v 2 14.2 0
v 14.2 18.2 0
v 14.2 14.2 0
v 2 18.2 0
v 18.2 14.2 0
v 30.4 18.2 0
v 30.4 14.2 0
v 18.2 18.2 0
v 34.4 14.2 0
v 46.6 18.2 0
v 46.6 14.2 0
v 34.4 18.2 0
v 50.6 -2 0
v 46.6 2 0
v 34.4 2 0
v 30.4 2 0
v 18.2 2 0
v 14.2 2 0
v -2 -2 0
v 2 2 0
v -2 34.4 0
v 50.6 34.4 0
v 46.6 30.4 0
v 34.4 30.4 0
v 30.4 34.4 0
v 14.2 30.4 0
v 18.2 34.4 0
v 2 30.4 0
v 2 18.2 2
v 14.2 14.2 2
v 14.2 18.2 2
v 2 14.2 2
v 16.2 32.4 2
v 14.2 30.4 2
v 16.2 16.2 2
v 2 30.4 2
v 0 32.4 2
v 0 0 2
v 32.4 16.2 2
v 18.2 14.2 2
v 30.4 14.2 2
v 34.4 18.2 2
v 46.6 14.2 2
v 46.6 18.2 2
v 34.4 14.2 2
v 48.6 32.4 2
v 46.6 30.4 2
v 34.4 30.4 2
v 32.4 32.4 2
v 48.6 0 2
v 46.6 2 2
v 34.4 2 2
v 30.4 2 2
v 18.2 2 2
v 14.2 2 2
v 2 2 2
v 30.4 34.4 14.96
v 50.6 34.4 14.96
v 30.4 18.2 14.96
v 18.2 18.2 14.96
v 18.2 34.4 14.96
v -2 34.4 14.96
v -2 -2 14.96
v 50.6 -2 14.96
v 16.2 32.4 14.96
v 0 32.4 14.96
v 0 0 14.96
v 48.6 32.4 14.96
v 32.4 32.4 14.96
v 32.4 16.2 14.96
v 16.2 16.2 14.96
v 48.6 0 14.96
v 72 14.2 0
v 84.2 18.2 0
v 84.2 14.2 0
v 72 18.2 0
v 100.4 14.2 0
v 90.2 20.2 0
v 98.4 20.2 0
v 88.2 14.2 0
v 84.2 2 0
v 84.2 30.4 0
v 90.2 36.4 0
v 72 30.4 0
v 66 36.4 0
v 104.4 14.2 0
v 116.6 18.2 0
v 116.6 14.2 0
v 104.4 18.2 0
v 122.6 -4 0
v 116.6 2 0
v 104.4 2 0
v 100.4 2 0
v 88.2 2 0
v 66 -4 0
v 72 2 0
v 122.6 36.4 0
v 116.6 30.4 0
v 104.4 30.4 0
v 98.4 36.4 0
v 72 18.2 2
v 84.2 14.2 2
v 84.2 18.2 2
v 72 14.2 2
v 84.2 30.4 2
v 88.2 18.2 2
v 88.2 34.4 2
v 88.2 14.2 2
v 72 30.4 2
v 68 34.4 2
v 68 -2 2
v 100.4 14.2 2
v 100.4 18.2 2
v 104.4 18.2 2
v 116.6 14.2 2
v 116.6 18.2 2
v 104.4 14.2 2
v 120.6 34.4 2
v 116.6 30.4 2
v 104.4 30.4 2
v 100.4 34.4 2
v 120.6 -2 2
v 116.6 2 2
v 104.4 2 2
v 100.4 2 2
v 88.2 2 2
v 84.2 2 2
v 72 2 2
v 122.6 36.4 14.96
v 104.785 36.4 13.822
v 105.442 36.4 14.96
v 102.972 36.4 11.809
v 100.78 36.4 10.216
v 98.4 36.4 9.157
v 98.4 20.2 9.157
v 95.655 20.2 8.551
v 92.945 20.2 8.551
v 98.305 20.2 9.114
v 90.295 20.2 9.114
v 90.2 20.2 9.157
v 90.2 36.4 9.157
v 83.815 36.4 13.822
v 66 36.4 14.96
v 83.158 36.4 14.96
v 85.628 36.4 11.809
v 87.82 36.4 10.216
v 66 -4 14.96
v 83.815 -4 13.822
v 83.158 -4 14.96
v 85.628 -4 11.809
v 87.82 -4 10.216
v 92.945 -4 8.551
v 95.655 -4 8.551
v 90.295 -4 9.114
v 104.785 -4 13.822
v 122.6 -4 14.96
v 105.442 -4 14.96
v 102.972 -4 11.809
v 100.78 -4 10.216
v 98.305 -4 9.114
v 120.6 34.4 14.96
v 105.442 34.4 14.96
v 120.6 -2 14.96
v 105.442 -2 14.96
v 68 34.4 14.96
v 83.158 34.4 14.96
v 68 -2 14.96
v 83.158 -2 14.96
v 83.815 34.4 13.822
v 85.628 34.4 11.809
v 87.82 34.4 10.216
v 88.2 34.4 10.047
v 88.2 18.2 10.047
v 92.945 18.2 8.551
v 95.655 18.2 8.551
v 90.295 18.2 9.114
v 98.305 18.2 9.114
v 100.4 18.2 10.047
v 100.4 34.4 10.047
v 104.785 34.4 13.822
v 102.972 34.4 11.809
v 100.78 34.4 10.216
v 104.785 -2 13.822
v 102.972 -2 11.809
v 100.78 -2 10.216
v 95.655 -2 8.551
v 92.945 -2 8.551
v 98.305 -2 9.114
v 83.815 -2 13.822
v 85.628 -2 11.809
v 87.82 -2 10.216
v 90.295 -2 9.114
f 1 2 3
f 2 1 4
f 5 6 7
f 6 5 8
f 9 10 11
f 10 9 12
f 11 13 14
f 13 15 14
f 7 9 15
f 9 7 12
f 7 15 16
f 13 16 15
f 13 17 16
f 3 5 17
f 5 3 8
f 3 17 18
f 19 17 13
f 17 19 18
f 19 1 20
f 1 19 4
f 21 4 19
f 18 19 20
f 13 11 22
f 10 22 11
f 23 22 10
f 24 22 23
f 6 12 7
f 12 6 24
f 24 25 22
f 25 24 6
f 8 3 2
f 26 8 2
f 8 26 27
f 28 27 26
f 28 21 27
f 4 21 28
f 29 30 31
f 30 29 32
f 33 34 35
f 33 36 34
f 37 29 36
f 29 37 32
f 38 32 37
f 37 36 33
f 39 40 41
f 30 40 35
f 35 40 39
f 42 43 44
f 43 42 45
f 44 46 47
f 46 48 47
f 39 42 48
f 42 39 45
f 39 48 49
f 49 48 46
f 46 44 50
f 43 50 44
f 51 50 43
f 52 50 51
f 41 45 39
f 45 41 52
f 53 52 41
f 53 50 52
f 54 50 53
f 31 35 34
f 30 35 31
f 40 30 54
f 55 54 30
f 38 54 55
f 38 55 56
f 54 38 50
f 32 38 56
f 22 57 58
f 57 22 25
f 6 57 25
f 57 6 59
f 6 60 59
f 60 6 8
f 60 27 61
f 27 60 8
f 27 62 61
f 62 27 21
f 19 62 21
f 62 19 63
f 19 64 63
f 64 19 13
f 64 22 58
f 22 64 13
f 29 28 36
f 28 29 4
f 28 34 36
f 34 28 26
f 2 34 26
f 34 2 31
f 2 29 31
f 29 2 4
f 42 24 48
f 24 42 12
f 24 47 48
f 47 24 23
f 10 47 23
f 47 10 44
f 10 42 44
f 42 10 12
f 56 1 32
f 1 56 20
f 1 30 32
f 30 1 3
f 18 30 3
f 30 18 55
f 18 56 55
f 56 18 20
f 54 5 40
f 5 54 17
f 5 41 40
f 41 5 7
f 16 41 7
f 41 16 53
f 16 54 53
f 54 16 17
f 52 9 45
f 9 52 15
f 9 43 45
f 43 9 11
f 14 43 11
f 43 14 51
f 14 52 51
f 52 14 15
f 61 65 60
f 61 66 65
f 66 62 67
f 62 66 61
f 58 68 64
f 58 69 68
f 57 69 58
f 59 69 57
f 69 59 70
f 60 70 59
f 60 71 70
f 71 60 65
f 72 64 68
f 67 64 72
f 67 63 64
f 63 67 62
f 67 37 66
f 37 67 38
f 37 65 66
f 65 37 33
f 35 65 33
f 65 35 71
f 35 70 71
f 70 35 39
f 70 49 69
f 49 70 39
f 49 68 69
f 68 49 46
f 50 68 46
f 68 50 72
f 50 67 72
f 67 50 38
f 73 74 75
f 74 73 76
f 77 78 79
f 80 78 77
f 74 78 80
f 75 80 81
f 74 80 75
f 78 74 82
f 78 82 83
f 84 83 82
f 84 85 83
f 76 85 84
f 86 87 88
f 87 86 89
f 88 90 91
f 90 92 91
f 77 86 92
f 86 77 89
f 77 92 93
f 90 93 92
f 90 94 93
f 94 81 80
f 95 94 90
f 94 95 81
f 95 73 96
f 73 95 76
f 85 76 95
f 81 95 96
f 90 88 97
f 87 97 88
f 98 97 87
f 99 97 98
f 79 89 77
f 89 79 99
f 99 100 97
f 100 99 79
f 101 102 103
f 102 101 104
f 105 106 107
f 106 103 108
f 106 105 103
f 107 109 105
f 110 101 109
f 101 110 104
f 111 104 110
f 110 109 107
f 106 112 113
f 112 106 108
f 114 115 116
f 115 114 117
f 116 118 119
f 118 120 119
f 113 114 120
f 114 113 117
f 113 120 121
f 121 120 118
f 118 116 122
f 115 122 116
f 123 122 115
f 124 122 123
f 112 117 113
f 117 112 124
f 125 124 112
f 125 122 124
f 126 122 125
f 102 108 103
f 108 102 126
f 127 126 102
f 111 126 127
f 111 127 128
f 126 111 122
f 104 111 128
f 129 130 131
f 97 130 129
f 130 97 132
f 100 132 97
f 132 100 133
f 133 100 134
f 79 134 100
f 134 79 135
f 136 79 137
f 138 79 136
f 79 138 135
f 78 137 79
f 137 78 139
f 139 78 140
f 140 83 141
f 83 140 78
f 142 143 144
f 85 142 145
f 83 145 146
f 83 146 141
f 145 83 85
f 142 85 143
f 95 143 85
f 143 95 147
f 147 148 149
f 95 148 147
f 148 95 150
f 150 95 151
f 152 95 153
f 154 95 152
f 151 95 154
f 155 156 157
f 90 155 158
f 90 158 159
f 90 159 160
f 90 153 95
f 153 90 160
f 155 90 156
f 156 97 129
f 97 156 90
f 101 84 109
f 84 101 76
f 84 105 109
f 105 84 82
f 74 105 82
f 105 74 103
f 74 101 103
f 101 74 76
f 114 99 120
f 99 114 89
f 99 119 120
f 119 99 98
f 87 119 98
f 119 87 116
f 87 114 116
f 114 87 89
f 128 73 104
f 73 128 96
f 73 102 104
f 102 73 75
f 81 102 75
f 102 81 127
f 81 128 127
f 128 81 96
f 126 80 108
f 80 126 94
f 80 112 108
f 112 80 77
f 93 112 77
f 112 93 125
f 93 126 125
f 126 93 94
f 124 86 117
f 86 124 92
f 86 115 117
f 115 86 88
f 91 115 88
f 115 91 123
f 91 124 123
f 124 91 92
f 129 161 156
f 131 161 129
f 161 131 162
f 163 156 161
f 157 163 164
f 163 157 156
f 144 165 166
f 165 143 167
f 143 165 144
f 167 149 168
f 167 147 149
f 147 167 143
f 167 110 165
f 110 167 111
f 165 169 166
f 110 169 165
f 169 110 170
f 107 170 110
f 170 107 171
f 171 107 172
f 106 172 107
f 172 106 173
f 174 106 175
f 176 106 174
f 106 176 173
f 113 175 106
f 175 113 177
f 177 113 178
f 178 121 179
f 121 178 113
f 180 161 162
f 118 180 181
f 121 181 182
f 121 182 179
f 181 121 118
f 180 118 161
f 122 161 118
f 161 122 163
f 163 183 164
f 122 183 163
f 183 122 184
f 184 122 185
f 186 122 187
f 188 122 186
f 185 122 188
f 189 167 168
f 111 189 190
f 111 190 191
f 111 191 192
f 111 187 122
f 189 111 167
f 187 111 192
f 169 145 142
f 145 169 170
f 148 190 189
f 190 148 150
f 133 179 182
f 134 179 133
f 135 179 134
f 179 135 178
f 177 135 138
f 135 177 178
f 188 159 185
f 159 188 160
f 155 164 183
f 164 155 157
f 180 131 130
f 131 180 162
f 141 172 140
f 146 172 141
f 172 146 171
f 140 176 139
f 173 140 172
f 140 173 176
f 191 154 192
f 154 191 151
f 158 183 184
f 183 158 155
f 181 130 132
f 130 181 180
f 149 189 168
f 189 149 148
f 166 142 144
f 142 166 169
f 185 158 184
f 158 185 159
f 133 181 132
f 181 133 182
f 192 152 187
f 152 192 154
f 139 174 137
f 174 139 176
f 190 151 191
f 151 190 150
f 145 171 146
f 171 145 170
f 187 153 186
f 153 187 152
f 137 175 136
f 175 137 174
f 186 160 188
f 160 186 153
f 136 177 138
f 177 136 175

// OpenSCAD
// file: diceware.scad
mm = 1;

die_width = 16.2 * mm;
wall_width = 2 * mm;
wall_height = 0.8 * die_width;
window_border = 2 * mm;

module clamshell()
{
    linear_extrude(wall_width) difference()
    {
        offset(delta = wall_width) children(0);
        if ($children > 1)
        {
            children(1);
        }
    }

    translate([ 0, 0, wall_width ]) linear_extrude(wall_height) difference()
    {
        offset(delta = wall_width) children(0);
        children(0);
    }
}

module window()
{
    offset(delta = -window_border) scale(die_width) polygon([ [ 0, 0 ], [ 1, 0 ], [ 1, 1 ], [ 0, 1 ] ]);
}

module diceware_bottom()
{
    clamshell()
    {
        // Base
        children(0);
        // Base Cutouts
        children(1);
    }
}

module diceware_top()
{
    difference()
    {
        clamshell()
        {
            // Base
            offset(delta = wall_width) children(0);

            // Base Cutouts
            children(1);
        }
        // Wall Cutouts
        children(2);
    }
}
// main file
include <diceware.scad>

module u_base()
{
    scale([ die_width, die_width ])
        polygon([ [ 0, 0 ], [ 3, 0 ], [ 3, 2 ], [ 2, 2 ], [ 2, 1 ], [ 1, 1 ], [ 1, 2 ], [ 0, 2 ] ]);
}

module u_windows()
{
    for (x = [ [ 0, 1 ], [ 0, 0 ], [ 1, 0 ], [ 2, 0 ], [ 2, 1 ] ])
    {
        translate(die_width * x) window();
    }
}

module u_bottom()
{
    diceware_bottom()
    {
        u_base();
        u_windows();
    }
}

module u_top()
{
    diceware_top()
    {
        u_base();
        u_windows();
        translate([ 1.5 * die_width, -2 * wall_width - 0.1 * mm, wall_width + wall_height * 1.5 ]) rotate([ -90, 0, 0 ])
            cylinder(r = wall_height, h = 2 * die_width + 4 * wall_width + 0.2 * mm);
    }
}

u_bottom();
translate([ 70, 0, 0 ]) u_top();
